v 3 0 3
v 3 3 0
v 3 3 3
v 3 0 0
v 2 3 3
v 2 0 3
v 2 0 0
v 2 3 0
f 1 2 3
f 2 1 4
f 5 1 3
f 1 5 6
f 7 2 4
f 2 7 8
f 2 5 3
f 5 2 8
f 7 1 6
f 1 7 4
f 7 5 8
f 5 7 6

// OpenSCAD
intersection_for(i=[0:2])
    translate([i, 0, 0]) cube([3, 3, 3]);
